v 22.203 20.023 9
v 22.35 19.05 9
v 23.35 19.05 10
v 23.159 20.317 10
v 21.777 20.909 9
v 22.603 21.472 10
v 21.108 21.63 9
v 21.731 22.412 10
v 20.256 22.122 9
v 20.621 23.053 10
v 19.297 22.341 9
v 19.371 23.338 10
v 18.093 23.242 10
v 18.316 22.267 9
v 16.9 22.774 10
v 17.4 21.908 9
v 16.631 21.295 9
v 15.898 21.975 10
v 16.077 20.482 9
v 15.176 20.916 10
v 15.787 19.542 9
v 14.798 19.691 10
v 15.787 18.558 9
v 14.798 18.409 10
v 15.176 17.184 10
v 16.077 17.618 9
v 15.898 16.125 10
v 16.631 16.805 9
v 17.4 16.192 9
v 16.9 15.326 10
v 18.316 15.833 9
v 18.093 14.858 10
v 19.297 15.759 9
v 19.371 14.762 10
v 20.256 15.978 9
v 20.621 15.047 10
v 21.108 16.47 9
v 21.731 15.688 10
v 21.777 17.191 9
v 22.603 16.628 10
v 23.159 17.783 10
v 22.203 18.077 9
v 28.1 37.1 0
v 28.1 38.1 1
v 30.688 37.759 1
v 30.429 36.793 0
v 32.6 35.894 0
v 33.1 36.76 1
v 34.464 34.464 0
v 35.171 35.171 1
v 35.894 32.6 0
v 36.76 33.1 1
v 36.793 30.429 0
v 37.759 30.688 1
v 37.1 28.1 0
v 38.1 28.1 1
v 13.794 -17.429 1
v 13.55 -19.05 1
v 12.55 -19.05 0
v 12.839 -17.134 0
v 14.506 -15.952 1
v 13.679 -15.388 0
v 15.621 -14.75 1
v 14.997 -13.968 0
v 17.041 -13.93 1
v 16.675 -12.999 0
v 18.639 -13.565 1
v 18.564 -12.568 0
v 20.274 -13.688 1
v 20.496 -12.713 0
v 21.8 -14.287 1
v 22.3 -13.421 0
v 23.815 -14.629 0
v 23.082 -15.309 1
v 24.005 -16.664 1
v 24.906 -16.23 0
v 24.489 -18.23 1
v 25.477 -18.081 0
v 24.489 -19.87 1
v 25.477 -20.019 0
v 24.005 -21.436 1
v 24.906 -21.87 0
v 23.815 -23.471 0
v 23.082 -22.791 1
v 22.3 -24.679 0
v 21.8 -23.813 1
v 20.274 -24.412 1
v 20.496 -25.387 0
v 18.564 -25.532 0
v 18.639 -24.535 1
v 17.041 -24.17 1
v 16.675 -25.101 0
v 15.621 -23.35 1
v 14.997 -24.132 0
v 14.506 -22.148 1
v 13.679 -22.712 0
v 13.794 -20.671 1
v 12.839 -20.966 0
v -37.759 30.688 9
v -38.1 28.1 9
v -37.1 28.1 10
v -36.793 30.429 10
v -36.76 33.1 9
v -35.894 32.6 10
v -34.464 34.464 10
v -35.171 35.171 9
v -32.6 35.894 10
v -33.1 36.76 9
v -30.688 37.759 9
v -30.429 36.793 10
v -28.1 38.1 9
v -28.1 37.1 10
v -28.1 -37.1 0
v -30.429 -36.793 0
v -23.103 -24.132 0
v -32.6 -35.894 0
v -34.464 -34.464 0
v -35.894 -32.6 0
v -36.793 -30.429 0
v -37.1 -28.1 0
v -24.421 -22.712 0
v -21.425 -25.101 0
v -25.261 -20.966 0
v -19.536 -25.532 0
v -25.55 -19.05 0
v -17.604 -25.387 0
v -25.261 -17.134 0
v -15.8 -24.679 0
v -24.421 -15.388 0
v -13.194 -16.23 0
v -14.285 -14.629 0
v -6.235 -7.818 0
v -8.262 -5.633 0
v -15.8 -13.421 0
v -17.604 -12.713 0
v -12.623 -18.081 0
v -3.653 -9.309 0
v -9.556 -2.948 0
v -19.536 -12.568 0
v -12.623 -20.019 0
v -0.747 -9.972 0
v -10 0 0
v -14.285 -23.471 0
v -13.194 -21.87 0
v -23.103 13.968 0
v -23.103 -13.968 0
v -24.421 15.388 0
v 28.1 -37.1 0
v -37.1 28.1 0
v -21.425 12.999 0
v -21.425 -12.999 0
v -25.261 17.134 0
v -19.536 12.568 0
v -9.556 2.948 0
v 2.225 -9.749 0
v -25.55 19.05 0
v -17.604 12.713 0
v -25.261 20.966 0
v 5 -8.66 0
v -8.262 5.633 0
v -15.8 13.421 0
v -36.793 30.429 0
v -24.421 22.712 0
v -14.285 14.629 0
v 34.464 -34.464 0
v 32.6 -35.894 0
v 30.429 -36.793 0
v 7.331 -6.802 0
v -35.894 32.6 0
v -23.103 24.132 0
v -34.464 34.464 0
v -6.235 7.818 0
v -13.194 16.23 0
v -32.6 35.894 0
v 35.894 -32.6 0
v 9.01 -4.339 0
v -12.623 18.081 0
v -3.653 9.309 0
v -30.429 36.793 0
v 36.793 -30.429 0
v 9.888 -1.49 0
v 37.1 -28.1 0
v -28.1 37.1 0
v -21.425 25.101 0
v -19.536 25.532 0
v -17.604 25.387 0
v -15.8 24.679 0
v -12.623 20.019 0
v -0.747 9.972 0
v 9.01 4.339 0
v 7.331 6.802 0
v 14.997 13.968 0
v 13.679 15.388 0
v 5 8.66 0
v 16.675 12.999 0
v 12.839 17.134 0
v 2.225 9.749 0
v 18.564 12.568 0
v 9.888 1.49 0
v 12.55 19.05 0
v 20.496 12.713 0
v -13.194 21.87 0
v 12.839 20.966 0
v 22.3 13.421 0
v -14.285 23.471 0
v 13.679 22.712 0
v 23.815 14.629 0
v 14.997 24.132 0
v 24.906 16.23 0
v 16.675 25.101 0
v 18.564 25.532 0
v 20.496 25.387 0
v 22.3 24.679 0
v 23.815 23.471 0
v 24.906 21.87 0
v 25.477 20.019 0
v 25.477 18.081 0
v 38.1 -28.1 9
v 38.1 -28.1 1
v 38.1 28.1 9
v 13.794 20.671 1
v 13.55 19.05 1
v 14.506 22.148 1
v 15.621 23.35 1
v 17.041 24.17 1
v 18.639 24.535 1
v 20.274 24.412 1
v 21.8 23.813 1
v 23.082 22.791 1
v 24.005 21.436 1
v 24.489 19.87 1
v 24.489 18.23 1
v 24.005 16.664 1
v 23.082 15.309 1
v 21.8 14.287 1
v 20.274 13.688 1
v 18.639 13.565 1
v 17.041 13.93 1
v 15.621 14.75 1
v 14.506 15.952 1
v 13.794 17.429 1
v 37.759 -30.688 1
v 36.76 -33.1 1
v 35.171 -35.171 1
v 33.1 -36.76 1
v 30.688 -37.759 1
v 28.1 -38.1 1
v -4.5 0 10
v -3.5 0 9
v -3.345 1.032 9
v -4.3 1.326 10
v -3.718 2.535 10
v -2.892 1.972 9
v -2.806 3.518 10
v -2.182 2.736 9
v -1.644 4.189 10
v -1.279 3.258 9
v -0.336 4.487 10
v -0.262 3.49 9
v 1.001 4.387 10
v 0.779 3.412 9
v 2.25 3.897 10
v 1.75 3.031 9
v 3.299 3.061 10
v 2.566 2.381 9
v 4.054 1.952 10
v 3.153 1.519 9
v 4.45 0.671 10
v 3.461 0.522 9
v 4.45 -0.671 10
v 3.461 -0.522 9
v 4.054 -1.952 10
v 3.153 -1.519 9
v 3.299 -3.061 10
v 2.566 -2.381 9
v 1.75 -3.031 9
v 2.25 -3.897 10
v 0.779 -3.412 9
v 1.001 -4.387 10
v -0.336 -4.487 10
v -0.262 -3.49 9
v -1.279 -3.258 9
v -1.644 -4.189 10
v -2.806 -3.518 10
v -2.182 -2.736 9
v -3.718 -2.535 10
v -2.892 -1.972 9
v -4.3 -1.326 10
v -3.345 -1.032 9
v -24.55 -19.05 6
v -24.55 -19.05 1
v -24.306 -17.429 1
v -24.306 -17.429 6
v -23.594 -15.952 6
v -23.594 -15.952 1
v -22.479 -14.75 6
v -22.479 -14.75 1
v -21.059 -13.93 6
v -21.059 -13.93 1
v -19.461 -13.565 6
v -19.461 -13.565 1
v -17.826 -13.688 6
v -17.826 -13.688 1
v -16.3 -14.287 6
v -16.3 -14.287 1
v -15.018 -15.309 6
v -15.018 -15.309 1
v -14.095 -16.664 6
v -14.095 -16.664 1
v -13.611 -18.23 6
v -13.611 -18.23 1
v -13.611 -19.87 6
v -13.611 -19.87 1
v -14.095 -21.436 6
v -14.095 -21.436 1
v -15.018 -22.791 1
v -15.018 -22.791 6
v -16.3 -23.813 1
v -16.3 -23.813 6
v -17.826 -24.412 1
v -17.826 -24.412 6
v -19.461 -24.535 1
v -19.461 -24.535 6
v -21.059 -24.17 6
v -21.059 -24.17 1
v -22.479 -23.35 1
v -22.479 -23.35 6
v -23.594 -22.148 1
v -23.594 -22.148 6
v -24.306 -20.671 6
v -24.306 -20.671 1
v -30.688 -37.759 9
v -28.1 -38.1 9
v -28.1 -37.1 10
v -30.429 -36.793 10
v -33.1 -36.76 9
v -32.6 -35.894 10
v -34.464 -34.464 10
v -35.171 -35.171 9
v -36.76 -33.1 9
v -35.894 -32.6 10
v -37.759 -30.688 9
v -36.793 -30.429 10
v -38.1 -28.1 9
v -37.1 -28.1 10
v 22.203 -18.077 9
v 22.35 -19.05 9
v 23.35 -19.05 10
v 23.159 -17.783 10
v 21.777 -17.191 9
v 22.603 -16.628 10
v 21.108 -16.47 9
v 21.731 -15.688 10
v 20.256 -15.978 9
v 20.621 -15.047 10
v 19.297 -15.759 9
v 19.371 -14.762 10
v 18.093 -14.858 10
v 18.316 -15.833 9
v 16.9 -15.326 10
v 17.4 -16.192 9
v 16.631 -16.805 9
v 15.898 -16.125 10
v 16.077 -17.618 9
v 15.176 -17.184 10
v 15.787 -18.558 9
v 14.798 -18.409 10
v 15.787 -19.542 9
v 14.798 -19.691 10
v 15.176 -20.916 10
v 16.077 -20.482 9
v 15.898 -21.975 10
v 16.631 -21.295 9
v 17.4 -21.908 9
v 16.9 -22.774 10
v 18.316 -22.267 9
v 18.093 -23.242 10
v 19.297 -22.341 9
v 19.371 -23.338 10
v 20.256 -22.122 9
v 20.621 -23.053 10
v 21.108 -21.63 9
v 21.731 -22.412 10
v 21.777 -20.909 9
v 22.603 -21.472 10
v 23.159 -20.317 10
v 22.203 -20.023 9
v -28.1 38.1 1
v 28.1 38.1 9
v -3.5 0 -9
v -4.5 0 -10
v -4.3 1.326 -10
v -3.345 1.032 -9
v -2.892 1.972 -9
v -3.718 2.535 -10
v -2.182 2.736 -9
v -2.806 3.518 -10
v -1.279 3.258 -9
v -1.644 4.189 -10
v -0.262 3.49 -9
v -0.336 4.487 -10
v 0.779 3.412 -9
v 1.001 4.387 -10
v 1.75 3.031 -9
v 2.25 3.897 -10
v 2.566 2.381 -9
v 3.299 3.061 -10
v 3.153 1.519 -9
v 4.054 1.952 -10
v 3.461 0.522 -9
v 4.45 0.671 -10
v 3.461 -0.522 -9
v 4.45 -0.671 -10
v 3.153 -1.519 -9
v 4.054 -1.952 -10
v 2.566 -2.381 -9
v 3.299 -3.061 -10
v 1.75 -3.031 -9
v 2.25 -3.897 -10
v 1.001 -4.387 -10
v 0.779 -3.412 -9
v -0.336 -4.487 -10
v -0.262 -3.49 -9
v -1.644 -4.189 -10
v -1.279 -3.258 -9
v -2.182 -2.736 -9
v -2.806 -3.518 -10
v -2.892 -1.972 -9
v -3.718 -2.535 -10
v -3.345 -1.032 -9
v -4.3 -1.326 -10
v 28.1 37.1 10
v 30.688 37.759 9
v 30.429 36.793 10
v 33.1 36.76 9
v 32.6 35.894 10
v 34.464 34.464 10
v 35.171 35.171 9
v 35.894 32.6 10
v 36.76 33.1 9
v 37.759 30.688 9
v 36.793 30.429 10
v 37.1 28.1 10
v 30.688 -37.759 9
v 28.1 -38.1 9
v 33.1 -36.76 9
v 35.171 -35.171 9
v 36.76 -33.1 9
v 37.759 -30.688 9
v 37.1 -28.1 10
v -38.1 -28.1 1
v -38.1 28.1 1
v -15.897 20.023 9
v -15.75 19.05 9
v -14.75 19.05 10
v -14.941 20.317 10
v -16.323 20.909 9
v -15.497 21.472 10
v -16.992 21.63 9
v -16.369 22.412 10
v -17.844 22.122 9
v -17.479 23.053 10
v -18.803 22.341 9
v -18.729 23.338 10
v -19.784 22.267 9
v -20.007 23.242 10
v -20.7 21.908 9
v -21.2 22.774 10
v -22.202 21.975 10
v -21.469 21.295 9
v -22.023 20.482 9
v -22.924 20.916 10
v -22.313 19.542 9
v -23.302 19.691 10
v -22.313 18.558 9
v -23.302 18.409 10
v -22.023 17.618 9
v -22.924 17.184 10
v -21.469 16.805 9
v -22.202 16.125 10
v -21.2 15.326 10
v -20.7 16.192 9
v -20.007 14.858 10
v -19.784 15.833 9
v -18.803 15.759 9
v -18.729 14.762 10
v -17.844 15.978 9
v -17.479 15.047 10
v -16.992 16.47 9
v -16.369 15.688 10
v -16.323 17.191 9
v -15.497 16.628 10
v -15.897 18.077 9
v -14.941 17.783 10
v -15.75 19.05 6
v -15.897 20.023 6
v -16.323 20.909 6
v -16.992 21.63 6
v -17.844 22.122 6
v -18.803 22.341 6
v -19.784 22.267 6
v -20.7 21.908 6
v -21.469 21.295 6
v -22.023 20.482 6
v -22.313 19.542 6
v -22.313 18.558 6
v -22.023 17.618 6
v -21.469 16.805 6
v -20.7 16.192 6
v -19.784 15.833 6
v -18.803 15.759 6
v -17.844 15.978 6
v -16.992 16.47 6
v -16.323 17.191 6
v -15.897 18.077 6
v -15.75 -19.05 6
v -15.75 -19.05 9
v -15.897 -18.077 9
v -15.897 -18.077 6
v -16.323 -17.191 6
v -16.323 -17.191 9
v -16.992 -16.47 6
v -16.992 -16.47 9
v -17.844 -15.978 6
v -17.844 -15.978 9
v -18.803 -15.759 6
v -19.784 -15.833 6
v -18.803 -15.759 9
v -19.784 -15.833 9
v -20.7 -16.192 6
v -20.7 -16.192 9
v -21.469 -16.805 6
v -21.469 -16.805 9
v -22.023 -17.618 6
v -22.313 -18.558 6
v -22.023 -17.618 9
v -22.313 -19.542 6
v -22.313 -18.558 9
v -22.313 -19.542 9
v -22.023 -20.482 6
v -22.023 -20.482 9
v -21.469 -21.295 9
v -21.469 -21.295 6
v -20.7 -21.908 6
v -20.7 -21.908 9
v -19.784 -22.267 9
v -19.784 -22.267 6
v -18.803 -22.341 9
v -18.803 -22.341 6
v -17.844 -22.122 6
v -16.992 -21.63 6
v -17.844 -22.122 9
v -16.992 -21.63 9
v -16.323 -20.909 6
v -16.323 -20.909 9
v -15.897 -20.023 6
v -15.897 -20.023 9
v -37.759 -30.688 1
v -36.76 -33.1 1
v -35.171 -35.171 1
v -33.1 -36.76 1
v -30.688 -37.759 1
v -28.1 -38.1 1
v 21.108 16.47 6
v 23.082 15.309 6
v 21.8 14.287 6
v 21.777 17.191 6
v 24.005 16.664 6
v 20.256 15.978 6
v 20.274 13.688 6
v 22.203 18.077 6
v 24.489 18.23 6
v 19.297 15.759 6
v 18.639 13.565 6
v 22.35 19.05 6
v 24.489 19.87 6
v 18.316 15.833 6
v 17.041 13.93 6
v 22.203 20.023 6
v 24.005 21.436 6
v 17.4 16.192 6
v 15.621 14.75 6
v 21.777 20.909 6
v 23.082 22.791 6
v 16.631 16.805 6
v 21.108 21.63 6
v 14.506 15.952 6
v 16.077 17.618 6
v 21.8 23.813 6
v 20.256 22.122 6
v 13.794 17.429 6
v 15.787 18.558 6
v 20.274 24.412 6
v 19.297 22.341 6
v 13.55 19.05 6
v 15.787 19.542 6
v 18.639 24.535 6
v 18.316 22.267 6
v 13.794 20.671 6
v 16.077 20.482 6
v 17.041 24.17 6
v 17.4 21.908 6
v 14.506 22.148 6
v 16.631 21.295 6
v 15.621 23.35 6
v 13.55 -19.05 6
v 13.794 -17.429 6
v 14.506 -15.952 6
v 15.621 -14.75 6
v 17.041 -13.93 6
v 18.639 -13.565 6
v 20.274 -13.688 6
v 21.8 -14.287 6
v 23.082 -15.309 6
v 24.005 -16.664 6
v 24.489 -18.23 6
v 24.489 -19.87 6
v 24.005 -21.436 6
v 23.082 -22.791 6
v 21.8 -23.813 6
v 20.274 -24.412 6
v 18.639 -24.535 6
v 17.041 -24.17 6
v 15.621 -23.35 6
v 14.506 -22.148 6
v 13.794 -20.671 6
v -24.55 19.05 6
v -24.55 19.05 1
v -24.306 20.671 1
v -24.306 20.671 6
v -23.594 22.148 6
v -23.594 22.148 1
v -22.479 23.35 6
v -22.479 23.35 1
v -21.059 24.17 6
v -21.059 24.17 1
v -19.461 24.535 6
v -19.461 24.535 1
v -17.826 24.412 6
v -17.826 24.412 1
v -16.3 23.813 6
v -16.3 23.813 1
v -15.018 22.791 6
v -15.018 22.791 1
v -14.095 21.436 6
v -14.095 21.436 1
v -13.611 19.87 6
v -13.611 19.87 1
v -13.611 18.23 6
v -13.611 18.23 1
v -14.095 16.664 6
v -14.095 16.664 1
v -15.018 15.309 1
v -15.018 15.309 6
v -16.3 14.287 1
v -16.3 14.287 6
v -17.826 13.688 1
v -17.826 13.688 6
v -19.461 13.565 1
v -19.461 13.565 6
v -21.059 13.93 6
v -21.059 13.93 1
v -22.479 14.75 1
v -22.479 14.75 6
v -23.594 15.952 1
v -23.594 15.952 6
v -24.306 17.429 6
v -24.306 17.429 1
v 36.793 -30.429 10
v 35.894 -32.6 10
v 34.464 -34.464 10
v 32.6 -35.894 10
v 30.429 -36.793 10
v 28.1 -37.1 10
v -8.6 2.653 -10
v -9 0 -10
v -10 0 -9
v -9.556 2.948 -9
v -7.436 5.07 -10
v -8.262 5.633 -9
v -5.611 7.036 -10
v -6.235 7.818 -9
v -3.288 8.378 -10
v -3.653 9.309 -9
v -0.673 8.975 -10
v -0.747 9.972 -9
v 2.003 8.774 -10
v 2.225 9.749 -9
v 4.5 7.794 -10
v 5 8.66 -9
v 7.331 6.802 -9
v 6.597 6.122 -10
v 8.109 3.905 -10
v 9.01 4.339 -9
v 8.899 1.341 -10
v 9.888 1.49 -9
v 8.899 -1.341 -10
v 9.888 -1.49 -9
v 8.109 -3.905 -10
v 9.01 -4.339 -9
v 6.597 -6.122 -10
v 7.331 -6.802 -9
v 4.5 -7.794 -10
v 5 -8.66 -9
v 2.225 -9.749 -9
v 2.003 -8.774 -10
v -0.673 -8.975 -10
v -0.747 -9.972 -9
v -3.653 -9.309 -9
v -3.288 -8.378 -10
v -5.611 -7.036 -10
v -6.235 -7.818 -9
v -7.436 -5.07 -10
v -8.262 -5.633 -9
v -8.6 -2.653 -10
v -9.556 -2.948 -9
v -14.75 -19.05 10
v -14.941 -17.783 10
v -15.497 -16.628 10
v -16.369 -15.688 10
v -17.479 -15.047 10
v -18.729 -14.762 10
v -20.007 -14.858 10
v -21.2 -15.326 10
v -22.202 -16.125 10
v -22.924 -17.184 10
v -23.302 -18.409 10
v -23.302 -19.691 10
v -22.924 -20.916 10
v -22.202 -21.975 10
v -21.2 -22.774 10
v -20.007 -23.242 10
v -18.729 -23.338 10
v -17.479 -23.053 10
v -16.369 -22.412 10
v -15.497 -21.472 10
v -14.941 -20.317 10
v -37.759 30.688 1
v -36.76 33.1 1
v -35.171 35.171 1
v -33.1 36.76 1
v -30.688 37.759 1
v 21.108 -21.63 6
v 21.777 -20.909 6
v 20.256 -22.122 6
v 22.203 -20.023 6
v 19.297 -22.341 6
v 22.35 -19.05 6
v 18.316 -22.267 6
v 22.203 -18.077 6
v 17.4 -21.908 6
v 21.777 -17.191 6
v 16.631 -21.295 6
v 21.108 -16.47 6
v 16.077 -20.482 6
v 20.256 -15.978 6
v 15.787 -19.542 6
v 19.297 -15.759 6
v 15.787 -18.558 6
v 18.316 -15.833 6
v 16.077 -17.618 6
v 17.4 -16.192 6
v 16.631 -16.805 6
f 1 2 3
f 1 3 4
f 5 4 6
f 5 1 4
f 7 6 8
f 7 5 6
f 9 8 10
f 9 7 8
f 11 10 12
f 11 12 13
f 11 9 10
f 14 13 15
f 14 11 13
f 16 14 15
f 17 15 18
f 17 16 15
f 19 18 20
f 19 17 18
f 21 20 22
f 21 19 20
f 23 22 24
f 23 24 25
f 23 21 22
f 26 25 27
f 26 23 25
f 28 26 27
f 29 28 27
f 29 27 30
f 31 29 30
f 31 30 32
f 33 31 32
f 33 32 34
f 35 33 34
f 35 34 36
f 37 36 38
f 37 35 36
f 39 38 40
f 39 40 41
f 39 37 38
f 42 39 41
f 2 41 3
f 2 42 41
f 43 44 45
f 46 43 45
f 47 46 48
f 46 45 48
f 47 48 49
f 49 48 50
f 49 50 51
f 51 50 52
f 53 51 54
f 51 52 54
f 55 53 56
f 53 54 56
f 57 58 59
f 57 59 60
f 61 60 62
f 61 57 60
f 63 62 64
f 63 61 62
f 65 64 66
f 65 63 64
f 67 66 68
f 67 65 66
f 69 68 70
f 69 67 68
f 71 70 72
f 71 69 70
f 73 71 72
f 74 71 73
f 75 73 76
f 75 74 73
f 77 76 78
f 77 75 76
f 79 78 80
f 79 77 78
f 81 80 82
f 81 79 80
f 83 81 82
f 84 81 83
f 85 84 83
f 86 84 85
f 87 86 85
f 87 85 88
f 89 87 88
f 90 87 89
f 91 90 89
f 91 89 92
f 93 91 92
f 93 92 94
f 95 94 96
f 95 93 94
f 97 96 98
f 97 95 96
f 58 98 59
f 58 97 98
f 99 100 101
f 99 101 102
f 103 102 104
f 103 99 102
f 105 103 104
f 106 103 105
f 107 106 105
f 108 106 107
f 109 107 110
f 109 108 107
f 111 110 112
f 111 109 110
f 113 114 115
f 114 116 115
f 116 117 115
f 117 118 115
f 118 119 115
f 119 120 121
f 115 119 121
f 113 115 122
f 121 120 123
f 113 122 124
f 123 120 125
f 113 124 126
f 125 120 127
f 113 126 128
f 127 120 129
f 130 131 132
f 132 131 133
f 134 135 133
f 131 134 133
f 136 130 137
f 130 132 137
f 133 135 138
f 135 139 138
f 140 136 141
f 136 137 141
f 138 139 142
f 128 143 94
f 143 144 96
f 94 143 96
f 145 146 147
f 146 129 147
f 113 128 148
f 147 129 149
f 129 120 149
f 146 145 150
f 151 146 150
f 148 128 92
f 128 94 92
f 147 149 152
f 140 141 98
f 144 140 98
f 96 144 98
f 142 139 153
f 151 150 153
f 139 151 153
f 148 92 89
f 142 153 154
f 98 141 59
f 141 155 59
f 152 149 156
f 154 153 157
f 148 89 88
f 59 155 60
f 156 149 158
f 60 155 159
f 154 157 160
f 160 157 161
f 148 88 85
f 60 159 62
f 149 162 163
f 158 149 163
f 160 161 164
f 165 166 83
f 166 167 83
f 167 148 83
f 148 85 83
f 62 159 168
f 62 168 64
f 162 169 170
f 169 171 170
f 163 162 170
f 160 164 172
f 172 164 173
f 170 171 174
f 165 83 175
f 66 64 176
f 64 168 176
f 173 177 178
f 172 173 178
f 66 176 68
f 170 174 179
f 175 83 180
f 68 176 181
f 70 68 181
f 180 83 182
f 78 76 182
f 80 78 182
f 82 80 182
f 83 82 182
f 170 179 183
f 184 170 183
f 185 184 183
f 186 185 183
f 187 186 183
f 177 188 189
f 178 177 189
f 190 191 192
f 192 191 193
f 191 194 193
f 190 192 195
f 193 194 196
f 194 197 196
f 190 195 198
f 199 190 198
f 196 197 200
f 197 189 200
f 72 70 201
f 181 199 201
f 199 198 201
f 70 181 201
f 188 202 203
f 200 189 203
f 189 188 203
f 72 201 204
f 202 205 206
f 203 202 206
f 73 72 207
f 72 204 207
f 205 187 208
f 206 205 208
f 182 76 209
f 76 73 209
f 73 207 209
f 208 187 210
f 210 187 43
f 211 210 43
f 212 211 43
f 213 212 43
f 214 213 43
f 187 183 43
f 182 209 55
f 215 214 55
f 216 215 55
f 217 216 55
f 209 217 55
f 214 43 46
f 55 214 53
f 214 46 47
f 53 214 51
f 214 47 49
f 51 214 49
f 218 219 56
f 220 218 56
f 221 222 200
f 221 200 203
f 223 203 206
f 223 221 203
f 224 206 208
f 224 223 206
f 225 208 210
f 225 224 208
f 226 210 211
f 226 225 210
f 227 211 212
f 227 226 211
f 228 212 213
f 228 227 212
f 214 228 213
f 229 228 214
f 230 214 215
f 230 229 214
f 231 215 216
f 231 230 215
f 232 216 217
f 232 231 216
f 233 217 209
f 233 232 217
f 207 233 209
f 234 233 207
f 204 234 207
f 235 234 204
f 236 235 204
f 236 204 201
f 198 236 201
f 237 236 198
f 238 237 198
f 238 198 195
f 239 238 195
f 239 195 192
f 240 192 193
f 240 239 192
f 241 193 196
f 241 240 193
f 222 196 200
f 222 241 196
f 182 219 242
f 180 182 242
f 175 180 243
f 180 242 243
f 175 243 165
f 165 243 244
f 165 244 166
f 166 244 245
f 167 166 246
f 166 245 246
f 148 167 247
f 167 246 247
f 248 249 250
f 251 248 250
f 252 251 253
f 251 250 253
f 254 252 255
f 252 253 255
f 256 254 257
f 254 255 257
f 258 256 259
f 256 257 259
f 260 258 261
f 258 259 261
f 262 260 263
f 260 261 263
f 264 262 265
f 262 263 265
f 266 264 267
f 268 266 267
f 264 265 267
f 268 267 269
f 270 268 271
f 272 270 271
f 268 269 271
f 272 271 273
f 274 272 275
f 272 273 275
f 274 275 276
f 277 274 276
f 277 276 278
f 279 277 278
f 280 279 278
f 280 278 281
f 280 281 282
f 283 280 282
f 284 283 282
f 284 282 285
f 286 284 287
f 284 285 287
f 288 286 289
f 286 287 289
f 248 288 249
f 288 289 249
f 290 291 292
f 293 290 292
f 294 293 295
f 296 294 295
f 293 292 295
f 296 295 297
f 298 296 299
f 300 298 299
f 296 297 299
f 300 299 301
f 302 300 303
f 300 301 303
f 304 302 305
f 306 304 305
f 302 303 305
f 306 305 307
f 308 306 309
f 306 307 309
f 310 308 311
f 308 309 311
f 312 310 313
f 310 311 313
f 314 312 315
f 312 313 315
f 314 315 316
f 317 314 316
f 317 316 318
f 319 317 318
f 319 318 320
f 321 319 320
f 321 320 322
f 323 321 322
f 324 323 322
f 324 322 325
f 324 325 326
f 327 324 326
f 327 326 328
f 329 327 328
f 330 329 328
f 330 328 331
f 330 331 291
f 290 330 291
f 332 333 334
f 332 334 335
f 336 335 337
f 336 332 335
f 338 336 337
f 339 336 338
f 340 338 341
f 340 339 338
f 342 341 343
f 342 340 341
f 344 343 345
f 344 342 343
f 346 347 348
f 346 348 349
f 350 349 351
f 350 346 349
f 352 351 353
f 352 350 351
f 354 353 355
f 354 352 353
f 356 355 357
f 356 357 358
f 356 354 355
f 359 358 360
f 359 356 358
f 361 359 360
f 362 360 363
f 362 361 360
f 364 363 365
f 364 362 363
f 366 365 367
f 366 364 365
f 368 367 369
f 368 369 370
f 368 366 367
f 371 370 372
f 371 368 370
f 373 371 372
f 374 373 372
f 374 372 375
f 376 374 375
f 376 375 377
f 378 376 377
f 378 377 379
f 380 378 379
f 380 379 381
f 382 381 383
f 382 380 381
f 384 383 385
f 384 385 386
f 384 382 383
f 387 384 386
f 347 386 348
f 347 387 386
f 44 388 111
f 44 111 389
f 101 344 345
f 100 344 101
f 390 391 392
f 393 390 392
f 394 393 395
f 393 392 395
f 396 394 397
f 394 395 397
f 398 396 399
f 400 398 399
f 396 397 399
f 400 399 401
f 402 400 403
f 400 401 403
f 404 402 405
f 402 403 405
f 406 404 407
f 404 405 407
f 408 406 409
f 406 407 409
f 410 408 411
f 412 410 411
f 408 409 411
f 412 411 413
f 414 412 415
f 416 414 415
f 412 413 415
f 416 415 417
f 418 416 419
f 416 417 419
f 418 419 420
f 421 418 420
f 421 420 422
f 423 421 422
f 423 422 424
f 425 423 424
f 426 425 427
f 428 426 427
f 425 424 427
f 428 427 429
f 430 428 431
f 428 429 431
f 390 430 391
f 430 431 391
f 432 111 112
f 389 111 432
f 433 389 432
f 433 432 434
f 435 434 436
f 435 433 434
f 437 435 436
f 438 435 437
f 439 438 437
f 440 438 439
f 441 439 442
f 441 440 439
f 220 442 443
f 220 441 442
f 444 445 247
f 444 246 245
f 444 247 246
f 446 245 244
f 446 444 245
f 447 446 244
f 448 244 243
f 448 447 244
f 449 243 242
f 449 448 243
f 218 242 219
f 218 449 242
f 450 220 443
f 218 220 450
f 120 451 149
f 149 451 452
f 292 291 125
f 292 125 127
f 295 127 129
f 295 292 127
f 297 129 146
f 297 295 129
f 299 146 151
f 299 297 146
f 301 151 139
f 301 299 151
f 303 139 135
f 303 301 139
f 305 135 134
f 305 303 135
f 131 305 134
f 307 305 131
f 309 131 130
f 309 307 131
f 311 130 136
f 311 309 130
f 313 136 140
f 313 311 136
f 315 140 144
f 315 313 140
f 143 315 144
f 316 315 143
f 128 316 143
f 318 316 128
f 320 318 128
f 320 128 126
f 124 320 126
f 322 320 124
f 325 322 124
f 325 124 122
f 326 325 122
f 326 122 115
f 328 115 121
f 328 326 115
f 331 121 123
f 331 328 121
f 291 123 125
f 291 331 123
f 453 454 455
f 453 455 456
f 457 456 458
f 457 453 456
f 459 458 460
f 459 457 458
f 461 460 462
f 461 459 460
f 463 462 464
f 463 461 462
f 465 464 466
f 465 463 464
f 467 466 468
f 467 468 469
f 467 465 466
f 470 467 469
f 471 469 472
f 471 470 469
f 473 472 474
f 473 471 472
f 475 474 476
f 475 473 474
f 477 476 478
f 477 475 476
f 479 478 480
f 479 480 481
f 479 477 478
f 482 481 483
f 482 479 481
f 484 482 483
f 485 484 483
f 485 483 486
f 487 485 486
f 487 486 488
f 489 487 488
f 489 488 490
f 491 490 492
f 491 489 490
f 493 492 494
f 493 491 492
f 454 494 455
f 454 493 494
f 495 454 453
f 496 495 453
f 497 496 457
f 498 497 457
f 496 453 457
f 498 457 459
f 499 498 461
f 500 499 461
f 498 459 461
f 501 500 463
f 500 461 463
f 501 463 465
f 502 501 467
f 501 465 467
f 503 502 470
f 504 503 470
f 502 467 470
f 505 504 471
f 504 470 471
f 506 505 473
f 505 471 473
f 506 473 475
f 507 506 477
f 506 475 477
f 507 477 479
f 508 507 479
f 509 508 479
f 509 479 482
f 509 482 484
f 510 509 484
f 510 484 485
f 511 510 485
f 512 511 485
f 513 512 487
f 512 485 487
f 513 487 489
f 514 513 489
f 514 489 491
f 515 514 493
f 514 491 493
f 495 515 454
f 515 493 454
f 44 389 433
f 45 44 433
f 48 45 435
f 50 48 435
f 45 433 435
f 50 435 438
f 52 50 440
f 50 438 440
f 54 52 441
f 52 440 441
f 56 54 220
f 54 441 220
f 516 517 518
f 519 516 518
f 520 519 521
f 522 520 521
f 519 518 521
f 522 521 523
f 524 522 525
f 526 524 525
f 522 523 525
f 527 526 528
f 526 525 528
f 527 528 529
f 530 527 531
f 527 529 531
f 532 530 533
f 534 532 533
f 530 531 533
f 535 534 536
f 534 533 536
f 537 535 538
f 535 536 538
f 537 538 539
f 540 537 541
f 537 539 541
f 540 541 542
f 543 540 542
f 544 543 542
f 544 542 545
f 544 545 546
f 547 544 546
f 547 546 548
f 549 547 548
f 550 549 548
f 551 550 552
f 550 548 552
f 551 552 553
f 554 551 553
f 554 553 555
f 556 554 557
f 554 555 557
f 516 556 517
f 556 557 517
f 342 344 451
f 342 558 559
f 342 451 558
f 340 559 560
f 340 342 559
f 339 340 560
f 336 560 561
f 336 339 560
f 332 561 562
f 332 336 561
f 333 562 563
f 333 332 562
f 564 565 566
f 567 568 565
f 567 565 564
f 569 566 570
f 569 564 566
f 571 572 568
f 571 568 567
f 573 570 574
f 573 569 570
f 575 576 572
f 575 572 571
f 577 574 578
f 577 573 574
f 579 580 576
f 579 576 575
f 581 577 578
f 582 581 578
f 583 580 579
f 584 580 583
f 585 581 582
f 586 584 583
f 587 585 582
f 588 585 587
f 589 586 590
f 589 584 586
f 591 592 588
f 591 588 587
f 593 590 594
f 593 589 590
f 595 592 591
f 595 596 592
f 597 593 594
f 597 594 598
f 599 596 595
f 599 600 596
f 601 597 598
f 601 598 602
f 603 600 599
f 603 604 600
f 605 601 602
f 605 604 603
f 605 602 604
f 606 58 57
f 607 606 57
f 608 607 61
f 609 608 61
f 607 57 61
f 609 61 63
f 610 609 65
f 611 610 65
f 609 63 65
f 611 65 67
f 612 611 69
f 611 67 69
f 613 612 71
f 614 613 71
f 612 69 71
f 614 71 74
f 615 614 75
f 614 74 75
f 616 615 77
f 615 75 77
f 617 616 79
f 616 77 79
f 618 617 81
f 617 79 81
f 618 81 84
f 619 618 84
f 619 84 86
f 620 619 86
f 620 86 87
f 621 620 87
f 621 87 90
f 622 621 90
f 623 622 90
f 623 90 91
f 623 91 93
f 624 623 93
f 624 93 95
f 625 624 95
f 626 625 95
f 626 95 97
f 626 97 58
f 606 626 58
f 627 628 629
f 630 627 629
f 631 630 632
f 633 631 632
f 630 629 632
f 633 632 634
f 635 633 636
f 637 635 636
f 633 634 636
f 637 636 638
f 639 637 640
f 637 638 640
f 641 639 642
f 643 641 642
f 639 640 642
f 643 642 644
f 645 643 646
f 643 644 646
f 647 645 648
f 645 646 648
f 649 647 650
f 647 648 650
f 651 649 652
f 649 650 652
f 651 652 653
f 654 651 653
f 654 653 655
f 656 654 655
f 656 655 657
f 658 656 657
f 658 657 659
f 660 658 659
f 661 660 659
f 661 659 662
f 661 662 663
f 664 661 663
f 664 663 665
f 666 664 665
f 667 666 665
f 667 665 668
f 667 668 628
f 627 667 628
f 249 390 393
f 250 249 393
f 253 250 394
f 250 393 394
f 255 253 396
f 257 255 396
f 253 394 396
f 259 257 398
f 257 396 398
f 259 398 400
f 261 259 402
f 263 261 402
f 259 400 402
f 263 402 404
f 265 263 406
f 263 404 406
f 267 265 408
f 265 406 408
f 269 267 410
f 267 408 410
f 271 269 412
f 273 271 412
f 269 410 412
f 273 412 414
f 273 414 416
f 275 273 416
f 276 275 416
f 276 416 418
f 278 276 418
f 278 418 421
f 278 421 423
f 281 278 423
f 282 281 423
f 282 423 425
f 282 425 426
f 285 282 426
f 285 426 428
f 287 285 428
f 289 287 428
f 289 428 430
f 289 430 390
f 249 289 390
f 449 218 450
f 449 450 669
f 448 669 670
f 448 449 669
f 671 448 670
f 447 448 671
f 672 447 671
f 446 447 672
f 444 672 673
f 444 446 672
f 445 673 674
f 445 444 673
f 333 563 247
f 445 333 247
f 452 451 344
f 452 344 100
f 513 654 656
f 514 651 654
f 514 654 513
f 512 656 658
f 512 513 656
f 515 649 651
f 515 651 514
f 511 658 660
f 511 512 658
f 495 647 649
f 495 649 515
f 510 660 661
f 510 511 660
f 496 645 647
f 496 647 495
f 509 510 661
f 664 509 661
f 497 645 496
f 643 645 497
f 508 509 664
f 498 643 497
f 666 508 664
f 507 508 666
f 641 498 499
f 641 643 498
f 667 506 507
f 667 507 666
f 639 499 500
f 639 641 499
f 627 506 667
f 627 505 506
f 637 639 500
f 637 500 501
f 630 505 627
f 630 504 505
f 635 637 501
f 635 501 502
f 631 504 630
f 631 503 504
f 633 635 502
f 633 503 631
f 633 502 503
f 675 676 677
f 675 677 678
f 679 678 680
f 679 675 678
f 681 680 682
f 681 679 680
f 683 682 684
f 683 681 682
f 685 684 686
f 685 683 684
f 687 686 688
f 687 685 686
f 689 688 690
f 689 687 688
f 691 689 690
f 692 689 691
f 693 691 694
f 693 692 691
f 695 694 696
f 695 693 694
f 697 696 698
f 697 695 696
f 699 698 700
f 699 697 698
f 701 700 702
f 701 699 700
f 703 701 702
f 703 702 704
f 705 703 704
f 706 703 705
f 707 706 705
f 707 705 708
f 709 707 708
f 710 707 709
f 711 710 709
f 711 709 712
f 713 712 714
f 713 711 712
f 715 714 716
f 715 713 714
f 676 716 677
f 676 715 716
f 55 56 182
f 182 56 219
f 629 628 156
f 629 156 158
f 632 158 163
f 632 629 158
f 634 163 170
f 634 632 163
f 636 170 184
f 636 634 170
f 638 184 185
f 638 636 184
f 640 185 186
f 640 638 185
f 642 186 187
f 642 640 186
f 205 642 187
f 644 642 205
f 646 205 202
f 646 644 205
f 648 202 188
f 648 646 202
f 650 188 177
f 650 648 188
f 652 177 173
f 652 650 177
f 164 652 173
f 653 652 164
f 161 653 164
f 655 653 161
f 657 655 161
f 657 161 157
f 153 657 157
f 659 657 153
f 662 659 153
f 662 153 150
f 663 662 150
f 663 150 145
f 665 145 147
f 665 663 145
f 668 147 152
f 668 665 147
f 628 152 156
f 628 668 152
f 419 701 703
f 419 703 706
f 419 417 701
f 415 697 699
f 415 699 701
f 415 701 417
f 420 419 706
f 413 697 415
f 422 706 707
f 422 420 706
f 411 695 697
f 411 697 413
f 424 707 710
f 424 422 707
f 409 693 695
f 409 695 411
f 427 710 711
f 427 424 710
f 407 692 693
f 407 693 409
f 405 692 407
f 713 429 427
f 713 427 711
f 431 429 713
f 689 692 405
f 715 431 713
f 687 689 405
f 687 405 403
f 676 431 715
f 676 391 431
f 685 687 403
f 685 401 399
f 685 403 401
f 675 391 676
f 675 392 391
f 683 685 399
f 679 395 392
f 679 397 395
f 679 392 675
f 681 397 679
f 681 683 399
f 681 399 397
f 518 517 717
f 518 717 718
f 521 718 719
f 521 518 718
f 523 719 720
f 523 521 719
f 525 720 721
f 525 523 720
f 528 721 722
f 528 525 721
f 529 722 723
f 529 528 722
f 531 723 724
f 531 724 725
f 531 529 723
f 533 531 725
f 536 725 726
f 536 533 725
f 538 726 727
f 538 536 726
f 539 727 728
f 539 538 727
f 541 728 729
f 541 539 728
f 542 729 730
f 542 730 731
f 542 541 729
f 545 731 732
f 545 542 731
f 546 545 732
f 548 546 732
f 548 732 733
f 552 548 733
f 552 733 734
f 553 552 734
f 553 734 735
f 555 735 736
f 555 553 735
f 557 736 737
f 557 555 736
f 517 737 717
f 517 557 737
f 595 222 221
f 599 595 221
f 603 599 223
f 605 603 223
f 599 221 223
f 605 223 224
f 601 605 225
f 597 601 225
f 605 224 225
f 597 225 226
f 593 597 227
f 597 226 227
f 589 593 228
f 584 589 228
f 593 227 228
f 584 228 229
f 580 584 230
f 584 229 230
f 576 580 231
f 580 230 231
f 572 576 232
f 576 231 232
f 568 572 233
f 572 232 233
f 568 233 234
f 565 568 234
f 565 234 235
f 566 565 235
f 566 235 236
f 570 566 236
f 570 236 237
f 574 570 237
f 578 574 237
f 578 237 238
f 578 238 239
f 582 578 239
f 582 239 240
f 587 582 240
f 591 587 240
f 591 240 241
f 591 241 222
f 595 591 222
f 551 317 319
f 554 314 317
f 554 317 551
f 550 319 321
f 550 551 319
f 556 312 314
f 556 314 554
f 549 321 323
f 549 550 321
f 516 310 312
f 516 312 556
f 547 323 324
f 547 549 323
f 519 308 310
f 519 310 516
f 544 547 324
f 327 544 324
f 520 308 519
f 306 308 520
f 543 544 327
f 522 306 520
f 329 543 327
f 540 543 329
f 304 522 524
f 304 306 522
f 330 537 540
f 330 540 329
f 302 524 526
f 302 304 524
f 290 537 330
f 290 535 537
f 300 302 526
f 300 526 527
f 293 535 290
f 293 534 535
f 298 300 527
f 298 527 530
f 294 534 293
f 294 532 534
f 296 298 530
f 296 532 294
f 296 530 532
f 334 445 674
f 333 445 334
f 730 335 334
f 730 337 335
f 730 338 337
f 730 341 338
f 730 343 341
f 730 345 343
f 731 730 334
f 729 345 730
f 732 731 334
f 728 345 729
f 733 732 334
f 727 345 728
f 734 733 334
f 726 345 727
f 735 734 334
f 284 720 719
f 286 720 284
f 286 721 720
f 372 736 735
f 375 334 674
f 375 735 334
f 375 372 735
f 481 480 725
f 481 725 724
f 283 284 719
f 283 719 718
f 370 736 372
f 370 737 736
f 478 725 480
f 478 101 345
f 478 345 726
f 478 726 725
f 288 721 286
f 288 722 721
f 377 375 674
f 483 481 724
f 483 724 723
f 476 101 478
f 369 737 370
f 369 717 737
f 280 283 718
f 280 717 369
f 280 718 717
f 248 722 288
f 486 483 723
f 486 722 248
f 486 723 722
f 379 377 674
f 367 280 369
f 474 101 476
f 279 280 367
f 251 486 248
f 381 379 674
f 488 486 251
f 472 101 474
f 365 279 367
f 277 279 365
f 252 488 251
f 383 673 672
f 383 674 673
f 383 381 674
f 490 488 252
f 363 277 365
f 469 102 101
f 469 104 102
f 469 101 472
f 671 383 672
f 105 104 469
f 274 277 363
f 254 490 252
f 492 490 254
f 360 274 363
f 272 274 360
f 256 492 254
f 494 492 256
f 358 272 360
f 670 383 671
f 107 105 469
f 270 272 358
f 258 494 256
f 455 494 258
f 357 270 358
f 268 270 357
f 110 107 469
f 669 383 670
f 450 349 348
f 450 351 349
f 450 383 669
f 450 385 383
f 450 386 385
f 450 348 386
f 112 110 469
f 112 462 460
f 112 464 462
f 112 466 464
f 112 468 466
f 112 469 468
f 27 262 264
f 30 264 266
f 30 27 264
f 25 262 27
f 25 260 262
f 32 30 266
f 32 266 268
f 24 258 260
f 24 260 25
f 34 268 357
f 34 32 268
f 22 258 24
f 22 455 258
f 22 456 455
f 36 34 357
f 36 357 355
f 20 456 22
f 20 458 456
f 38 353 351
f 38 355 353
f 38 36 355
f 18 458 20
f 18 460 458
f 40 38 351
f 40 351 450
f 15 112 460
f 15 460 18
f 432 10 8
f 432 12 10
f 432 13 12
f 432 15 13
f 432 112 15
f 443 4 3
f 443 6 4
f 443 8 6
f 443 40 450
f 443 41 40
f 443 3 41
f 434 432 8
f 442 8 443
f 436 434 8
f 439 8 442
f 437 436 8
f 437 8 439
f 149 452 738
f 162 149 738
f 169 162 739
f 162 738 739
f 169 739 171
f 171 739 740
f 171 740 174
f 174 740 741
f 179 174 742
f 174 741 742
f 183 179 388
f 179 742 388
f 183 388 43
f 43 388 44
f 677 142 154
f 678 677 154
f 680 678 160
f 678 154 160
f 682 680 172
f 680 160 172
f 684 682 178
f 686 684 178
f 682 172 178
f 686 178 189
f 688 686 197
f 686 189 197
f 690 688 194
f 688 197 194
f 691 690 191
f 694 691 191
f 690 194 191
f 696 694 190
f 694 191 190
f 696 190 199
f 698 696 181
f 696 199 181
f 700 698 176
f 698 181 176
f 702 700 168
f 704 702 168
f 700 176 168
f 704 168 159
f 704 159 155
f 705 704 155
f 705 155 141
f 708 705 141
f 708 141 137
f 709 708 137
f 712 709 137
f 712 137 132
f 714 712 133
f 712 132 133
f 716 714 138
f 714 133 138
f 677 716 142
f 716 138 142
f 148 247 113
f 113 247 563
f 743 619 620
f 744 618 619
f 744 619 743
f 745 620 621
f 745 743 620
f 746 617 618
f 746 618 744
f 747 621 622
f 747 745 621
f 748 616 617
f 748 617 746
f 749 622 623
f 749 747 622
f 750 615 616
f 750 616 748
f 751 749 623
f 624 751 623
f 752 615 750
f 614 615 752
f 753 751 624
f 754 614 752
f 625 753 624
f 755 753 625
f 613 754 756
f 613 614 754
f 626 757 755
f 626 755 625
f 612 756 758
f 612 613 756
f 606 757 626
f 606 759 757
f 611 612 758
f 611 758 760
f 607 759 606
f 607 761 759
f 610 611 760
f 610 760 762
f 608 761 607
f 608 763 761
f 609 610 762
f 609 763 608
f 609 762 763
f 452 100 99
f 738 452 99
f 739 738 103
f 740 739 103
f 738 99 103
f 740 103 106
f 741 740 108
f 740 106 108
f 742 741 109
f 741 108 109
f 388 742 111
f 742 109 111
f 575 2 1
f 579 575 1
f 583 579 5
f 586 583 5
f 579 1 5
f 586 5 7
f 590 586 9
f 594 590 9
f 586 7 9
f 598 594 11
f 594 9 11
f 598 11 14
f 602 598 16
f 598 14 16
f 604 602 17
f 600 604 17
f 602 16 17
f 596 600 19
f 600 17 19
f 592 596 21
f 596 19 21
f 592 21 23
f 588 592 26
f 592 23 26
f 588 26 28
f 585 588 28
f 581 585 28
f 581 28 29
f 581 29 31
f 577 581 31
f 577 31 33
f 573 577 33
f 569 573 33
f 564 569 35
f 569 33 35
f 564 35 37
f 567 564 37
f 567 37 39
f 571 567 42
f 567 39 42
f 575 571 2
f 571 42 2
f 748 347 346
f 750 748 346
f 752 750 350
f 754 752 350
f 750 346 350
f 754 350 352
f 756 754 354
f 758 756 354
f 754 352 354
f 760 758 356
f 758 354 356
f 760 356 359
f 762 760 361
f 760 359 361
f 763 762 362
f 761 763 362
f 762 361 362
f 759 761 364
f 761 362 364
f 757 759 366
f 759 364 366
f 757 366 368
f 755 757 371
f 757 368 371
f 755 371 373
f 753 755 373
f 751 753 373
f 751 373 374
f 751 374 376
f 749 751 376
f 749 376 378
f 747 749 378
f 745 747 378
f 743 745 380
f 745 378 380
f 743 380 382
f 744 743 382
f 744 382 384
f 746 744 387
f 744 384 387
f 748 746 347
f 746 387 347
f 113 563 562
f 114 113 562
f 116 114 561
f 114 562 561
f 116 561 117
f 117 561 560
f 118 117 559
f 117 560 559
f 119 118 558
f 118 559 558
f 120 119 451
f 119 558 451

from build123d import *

# Parameters (mm, degrees)
SKETCH3_W                                     = 76.2
SKETCH3_H                                     = 76.2
BOSS_EXTRUDE3_DEPTH                           = 10
CBORE_FOR_M6_HEX_SOCKET_HEAD_CAP1_D           = 6.6
CBORE_FOR_M6_HEX_SOCKET_HEAD_CAP1_CBORE_D     = 11
CBORE_FOR_M6_HEX_SOCKET_HEAD_CAP1_CBORE_DEPTH = 6
FILLET1_R                                     = 10
SKETCH2_R                                     = 10
BOSS_EXTRUDE4_DEPTH                           = 10
SKETCH9_R                                     = 3.5
CUT_EXTRUDE1_DEPTH                            = 58.473646135
CHAMFER1_SIZE                                 = 1


with BuildPart() as part:
    # Sketch3 → Boss-Extrude3 (new body)
    with BuildSketch(Plane.XY):
        Rectangle(SKETCH3_W, SKETCH3_H)
    extrude(amount=BOSS_EXTRUDE3_DEPTH)

    # CBORE for M6 Hex Socket Head Cap1 (through all)
    with Locations(Plane(origin=(0, 0, 0), x_dir=(-1, 0, 0), z_dir=(0, 0, -1))):
        with Locations((19.05, 19.05), (19.05, -19.05), (-19.05, 19.05), (-19.05, -19.05)):
            CounterBoreHole(CBORE_FOR_M6_HEX_SOCKET_HEAD_CAP1_D / 2, CBORE_FOR_M6_HEX_SOCKET_HEAD_CAP1_CBORE_D / 2, CBORE_FOR_M6_HEX_SOCKET_HEAD_CAP1_CBORE_DEPTH)

    # Fillet1
    fillet1_edges = [part.edges().sort_by_distance(p)[0] for p in [
        (38.1, -38.1, 5),
        (-38.1, -38.1, 5),
        (-38.1, 38.1, 5),
        (38.1, 38.1, 5),
    ]]
    fillet(fillet1_edges, radius=FILLET1_R)

    # Sketch2 → Boss-Extrude4 (add)
    with BuildSketch(Plane(origin=(0, 0, 0), x_dir=(-1, 0, 0), z_dir=(0, 0, -1))):
        Circle(SKETCH2_R)
    extrude(amount=BOSS_EXTRUDE4_DEPTH)

    # Sketch9 → Cut-Extrude1 (cut, through all)
    with BuildSketch(Plane(origin=(0, 0, -10), x_dir=(-1, 0, 0), z_dir=(0, 0, -1))):
        Circle(SKETCH9_R)
    extrude(amount=-CUT_EXTRUDE1_DEPTH, mode=Mode.SUBTRACT)

    # Chamfer1
    chamfer1_edges = [part.edges().sort_by_distance(p)[0] for p in [
        (24.55, -19.05, 0),
        (15.75, -19.05, 10),
        (24.55, 19.05, 0),
        (15.75, 19.05, 10),
        (-13.55, -19.05, 0),
        (-22.35, -19.05, 10),
        (-13.55, 19.05, 0),
        (-22.35, 19.05, 10),
        (0, 38.1, 0),
        (0, 38.1, 10),
        (38.1, 0, 0),
        (0, -38.1, 0),
        (-38.1, 0, 0),
        (-35.171067812, 35.171067812, 0),
        (-35.171067812, -35.171067812, 0),
        (35.171067812, -35.171067812, 0),
        (35.171067812, 35.171067812, 0),
        (38.1, 0, 10),
        (-38.1, 0, 10),
        (0, -38.1, 10),
        (-35.171067812, 35.171067812, 10),
        (-35.171067812, -35.171067812, 10),
        (35.171067812, -35.171067812, 10),
        (35.171067812, 35.171067812, 10),
        (10, 0, -10),
        (3.5, 0, 10),
        (3.5, 0, -10),
    ]]
    chamfer(chamfer1_edges, length=CHAMFER1_SIZE)


solid = part.part
